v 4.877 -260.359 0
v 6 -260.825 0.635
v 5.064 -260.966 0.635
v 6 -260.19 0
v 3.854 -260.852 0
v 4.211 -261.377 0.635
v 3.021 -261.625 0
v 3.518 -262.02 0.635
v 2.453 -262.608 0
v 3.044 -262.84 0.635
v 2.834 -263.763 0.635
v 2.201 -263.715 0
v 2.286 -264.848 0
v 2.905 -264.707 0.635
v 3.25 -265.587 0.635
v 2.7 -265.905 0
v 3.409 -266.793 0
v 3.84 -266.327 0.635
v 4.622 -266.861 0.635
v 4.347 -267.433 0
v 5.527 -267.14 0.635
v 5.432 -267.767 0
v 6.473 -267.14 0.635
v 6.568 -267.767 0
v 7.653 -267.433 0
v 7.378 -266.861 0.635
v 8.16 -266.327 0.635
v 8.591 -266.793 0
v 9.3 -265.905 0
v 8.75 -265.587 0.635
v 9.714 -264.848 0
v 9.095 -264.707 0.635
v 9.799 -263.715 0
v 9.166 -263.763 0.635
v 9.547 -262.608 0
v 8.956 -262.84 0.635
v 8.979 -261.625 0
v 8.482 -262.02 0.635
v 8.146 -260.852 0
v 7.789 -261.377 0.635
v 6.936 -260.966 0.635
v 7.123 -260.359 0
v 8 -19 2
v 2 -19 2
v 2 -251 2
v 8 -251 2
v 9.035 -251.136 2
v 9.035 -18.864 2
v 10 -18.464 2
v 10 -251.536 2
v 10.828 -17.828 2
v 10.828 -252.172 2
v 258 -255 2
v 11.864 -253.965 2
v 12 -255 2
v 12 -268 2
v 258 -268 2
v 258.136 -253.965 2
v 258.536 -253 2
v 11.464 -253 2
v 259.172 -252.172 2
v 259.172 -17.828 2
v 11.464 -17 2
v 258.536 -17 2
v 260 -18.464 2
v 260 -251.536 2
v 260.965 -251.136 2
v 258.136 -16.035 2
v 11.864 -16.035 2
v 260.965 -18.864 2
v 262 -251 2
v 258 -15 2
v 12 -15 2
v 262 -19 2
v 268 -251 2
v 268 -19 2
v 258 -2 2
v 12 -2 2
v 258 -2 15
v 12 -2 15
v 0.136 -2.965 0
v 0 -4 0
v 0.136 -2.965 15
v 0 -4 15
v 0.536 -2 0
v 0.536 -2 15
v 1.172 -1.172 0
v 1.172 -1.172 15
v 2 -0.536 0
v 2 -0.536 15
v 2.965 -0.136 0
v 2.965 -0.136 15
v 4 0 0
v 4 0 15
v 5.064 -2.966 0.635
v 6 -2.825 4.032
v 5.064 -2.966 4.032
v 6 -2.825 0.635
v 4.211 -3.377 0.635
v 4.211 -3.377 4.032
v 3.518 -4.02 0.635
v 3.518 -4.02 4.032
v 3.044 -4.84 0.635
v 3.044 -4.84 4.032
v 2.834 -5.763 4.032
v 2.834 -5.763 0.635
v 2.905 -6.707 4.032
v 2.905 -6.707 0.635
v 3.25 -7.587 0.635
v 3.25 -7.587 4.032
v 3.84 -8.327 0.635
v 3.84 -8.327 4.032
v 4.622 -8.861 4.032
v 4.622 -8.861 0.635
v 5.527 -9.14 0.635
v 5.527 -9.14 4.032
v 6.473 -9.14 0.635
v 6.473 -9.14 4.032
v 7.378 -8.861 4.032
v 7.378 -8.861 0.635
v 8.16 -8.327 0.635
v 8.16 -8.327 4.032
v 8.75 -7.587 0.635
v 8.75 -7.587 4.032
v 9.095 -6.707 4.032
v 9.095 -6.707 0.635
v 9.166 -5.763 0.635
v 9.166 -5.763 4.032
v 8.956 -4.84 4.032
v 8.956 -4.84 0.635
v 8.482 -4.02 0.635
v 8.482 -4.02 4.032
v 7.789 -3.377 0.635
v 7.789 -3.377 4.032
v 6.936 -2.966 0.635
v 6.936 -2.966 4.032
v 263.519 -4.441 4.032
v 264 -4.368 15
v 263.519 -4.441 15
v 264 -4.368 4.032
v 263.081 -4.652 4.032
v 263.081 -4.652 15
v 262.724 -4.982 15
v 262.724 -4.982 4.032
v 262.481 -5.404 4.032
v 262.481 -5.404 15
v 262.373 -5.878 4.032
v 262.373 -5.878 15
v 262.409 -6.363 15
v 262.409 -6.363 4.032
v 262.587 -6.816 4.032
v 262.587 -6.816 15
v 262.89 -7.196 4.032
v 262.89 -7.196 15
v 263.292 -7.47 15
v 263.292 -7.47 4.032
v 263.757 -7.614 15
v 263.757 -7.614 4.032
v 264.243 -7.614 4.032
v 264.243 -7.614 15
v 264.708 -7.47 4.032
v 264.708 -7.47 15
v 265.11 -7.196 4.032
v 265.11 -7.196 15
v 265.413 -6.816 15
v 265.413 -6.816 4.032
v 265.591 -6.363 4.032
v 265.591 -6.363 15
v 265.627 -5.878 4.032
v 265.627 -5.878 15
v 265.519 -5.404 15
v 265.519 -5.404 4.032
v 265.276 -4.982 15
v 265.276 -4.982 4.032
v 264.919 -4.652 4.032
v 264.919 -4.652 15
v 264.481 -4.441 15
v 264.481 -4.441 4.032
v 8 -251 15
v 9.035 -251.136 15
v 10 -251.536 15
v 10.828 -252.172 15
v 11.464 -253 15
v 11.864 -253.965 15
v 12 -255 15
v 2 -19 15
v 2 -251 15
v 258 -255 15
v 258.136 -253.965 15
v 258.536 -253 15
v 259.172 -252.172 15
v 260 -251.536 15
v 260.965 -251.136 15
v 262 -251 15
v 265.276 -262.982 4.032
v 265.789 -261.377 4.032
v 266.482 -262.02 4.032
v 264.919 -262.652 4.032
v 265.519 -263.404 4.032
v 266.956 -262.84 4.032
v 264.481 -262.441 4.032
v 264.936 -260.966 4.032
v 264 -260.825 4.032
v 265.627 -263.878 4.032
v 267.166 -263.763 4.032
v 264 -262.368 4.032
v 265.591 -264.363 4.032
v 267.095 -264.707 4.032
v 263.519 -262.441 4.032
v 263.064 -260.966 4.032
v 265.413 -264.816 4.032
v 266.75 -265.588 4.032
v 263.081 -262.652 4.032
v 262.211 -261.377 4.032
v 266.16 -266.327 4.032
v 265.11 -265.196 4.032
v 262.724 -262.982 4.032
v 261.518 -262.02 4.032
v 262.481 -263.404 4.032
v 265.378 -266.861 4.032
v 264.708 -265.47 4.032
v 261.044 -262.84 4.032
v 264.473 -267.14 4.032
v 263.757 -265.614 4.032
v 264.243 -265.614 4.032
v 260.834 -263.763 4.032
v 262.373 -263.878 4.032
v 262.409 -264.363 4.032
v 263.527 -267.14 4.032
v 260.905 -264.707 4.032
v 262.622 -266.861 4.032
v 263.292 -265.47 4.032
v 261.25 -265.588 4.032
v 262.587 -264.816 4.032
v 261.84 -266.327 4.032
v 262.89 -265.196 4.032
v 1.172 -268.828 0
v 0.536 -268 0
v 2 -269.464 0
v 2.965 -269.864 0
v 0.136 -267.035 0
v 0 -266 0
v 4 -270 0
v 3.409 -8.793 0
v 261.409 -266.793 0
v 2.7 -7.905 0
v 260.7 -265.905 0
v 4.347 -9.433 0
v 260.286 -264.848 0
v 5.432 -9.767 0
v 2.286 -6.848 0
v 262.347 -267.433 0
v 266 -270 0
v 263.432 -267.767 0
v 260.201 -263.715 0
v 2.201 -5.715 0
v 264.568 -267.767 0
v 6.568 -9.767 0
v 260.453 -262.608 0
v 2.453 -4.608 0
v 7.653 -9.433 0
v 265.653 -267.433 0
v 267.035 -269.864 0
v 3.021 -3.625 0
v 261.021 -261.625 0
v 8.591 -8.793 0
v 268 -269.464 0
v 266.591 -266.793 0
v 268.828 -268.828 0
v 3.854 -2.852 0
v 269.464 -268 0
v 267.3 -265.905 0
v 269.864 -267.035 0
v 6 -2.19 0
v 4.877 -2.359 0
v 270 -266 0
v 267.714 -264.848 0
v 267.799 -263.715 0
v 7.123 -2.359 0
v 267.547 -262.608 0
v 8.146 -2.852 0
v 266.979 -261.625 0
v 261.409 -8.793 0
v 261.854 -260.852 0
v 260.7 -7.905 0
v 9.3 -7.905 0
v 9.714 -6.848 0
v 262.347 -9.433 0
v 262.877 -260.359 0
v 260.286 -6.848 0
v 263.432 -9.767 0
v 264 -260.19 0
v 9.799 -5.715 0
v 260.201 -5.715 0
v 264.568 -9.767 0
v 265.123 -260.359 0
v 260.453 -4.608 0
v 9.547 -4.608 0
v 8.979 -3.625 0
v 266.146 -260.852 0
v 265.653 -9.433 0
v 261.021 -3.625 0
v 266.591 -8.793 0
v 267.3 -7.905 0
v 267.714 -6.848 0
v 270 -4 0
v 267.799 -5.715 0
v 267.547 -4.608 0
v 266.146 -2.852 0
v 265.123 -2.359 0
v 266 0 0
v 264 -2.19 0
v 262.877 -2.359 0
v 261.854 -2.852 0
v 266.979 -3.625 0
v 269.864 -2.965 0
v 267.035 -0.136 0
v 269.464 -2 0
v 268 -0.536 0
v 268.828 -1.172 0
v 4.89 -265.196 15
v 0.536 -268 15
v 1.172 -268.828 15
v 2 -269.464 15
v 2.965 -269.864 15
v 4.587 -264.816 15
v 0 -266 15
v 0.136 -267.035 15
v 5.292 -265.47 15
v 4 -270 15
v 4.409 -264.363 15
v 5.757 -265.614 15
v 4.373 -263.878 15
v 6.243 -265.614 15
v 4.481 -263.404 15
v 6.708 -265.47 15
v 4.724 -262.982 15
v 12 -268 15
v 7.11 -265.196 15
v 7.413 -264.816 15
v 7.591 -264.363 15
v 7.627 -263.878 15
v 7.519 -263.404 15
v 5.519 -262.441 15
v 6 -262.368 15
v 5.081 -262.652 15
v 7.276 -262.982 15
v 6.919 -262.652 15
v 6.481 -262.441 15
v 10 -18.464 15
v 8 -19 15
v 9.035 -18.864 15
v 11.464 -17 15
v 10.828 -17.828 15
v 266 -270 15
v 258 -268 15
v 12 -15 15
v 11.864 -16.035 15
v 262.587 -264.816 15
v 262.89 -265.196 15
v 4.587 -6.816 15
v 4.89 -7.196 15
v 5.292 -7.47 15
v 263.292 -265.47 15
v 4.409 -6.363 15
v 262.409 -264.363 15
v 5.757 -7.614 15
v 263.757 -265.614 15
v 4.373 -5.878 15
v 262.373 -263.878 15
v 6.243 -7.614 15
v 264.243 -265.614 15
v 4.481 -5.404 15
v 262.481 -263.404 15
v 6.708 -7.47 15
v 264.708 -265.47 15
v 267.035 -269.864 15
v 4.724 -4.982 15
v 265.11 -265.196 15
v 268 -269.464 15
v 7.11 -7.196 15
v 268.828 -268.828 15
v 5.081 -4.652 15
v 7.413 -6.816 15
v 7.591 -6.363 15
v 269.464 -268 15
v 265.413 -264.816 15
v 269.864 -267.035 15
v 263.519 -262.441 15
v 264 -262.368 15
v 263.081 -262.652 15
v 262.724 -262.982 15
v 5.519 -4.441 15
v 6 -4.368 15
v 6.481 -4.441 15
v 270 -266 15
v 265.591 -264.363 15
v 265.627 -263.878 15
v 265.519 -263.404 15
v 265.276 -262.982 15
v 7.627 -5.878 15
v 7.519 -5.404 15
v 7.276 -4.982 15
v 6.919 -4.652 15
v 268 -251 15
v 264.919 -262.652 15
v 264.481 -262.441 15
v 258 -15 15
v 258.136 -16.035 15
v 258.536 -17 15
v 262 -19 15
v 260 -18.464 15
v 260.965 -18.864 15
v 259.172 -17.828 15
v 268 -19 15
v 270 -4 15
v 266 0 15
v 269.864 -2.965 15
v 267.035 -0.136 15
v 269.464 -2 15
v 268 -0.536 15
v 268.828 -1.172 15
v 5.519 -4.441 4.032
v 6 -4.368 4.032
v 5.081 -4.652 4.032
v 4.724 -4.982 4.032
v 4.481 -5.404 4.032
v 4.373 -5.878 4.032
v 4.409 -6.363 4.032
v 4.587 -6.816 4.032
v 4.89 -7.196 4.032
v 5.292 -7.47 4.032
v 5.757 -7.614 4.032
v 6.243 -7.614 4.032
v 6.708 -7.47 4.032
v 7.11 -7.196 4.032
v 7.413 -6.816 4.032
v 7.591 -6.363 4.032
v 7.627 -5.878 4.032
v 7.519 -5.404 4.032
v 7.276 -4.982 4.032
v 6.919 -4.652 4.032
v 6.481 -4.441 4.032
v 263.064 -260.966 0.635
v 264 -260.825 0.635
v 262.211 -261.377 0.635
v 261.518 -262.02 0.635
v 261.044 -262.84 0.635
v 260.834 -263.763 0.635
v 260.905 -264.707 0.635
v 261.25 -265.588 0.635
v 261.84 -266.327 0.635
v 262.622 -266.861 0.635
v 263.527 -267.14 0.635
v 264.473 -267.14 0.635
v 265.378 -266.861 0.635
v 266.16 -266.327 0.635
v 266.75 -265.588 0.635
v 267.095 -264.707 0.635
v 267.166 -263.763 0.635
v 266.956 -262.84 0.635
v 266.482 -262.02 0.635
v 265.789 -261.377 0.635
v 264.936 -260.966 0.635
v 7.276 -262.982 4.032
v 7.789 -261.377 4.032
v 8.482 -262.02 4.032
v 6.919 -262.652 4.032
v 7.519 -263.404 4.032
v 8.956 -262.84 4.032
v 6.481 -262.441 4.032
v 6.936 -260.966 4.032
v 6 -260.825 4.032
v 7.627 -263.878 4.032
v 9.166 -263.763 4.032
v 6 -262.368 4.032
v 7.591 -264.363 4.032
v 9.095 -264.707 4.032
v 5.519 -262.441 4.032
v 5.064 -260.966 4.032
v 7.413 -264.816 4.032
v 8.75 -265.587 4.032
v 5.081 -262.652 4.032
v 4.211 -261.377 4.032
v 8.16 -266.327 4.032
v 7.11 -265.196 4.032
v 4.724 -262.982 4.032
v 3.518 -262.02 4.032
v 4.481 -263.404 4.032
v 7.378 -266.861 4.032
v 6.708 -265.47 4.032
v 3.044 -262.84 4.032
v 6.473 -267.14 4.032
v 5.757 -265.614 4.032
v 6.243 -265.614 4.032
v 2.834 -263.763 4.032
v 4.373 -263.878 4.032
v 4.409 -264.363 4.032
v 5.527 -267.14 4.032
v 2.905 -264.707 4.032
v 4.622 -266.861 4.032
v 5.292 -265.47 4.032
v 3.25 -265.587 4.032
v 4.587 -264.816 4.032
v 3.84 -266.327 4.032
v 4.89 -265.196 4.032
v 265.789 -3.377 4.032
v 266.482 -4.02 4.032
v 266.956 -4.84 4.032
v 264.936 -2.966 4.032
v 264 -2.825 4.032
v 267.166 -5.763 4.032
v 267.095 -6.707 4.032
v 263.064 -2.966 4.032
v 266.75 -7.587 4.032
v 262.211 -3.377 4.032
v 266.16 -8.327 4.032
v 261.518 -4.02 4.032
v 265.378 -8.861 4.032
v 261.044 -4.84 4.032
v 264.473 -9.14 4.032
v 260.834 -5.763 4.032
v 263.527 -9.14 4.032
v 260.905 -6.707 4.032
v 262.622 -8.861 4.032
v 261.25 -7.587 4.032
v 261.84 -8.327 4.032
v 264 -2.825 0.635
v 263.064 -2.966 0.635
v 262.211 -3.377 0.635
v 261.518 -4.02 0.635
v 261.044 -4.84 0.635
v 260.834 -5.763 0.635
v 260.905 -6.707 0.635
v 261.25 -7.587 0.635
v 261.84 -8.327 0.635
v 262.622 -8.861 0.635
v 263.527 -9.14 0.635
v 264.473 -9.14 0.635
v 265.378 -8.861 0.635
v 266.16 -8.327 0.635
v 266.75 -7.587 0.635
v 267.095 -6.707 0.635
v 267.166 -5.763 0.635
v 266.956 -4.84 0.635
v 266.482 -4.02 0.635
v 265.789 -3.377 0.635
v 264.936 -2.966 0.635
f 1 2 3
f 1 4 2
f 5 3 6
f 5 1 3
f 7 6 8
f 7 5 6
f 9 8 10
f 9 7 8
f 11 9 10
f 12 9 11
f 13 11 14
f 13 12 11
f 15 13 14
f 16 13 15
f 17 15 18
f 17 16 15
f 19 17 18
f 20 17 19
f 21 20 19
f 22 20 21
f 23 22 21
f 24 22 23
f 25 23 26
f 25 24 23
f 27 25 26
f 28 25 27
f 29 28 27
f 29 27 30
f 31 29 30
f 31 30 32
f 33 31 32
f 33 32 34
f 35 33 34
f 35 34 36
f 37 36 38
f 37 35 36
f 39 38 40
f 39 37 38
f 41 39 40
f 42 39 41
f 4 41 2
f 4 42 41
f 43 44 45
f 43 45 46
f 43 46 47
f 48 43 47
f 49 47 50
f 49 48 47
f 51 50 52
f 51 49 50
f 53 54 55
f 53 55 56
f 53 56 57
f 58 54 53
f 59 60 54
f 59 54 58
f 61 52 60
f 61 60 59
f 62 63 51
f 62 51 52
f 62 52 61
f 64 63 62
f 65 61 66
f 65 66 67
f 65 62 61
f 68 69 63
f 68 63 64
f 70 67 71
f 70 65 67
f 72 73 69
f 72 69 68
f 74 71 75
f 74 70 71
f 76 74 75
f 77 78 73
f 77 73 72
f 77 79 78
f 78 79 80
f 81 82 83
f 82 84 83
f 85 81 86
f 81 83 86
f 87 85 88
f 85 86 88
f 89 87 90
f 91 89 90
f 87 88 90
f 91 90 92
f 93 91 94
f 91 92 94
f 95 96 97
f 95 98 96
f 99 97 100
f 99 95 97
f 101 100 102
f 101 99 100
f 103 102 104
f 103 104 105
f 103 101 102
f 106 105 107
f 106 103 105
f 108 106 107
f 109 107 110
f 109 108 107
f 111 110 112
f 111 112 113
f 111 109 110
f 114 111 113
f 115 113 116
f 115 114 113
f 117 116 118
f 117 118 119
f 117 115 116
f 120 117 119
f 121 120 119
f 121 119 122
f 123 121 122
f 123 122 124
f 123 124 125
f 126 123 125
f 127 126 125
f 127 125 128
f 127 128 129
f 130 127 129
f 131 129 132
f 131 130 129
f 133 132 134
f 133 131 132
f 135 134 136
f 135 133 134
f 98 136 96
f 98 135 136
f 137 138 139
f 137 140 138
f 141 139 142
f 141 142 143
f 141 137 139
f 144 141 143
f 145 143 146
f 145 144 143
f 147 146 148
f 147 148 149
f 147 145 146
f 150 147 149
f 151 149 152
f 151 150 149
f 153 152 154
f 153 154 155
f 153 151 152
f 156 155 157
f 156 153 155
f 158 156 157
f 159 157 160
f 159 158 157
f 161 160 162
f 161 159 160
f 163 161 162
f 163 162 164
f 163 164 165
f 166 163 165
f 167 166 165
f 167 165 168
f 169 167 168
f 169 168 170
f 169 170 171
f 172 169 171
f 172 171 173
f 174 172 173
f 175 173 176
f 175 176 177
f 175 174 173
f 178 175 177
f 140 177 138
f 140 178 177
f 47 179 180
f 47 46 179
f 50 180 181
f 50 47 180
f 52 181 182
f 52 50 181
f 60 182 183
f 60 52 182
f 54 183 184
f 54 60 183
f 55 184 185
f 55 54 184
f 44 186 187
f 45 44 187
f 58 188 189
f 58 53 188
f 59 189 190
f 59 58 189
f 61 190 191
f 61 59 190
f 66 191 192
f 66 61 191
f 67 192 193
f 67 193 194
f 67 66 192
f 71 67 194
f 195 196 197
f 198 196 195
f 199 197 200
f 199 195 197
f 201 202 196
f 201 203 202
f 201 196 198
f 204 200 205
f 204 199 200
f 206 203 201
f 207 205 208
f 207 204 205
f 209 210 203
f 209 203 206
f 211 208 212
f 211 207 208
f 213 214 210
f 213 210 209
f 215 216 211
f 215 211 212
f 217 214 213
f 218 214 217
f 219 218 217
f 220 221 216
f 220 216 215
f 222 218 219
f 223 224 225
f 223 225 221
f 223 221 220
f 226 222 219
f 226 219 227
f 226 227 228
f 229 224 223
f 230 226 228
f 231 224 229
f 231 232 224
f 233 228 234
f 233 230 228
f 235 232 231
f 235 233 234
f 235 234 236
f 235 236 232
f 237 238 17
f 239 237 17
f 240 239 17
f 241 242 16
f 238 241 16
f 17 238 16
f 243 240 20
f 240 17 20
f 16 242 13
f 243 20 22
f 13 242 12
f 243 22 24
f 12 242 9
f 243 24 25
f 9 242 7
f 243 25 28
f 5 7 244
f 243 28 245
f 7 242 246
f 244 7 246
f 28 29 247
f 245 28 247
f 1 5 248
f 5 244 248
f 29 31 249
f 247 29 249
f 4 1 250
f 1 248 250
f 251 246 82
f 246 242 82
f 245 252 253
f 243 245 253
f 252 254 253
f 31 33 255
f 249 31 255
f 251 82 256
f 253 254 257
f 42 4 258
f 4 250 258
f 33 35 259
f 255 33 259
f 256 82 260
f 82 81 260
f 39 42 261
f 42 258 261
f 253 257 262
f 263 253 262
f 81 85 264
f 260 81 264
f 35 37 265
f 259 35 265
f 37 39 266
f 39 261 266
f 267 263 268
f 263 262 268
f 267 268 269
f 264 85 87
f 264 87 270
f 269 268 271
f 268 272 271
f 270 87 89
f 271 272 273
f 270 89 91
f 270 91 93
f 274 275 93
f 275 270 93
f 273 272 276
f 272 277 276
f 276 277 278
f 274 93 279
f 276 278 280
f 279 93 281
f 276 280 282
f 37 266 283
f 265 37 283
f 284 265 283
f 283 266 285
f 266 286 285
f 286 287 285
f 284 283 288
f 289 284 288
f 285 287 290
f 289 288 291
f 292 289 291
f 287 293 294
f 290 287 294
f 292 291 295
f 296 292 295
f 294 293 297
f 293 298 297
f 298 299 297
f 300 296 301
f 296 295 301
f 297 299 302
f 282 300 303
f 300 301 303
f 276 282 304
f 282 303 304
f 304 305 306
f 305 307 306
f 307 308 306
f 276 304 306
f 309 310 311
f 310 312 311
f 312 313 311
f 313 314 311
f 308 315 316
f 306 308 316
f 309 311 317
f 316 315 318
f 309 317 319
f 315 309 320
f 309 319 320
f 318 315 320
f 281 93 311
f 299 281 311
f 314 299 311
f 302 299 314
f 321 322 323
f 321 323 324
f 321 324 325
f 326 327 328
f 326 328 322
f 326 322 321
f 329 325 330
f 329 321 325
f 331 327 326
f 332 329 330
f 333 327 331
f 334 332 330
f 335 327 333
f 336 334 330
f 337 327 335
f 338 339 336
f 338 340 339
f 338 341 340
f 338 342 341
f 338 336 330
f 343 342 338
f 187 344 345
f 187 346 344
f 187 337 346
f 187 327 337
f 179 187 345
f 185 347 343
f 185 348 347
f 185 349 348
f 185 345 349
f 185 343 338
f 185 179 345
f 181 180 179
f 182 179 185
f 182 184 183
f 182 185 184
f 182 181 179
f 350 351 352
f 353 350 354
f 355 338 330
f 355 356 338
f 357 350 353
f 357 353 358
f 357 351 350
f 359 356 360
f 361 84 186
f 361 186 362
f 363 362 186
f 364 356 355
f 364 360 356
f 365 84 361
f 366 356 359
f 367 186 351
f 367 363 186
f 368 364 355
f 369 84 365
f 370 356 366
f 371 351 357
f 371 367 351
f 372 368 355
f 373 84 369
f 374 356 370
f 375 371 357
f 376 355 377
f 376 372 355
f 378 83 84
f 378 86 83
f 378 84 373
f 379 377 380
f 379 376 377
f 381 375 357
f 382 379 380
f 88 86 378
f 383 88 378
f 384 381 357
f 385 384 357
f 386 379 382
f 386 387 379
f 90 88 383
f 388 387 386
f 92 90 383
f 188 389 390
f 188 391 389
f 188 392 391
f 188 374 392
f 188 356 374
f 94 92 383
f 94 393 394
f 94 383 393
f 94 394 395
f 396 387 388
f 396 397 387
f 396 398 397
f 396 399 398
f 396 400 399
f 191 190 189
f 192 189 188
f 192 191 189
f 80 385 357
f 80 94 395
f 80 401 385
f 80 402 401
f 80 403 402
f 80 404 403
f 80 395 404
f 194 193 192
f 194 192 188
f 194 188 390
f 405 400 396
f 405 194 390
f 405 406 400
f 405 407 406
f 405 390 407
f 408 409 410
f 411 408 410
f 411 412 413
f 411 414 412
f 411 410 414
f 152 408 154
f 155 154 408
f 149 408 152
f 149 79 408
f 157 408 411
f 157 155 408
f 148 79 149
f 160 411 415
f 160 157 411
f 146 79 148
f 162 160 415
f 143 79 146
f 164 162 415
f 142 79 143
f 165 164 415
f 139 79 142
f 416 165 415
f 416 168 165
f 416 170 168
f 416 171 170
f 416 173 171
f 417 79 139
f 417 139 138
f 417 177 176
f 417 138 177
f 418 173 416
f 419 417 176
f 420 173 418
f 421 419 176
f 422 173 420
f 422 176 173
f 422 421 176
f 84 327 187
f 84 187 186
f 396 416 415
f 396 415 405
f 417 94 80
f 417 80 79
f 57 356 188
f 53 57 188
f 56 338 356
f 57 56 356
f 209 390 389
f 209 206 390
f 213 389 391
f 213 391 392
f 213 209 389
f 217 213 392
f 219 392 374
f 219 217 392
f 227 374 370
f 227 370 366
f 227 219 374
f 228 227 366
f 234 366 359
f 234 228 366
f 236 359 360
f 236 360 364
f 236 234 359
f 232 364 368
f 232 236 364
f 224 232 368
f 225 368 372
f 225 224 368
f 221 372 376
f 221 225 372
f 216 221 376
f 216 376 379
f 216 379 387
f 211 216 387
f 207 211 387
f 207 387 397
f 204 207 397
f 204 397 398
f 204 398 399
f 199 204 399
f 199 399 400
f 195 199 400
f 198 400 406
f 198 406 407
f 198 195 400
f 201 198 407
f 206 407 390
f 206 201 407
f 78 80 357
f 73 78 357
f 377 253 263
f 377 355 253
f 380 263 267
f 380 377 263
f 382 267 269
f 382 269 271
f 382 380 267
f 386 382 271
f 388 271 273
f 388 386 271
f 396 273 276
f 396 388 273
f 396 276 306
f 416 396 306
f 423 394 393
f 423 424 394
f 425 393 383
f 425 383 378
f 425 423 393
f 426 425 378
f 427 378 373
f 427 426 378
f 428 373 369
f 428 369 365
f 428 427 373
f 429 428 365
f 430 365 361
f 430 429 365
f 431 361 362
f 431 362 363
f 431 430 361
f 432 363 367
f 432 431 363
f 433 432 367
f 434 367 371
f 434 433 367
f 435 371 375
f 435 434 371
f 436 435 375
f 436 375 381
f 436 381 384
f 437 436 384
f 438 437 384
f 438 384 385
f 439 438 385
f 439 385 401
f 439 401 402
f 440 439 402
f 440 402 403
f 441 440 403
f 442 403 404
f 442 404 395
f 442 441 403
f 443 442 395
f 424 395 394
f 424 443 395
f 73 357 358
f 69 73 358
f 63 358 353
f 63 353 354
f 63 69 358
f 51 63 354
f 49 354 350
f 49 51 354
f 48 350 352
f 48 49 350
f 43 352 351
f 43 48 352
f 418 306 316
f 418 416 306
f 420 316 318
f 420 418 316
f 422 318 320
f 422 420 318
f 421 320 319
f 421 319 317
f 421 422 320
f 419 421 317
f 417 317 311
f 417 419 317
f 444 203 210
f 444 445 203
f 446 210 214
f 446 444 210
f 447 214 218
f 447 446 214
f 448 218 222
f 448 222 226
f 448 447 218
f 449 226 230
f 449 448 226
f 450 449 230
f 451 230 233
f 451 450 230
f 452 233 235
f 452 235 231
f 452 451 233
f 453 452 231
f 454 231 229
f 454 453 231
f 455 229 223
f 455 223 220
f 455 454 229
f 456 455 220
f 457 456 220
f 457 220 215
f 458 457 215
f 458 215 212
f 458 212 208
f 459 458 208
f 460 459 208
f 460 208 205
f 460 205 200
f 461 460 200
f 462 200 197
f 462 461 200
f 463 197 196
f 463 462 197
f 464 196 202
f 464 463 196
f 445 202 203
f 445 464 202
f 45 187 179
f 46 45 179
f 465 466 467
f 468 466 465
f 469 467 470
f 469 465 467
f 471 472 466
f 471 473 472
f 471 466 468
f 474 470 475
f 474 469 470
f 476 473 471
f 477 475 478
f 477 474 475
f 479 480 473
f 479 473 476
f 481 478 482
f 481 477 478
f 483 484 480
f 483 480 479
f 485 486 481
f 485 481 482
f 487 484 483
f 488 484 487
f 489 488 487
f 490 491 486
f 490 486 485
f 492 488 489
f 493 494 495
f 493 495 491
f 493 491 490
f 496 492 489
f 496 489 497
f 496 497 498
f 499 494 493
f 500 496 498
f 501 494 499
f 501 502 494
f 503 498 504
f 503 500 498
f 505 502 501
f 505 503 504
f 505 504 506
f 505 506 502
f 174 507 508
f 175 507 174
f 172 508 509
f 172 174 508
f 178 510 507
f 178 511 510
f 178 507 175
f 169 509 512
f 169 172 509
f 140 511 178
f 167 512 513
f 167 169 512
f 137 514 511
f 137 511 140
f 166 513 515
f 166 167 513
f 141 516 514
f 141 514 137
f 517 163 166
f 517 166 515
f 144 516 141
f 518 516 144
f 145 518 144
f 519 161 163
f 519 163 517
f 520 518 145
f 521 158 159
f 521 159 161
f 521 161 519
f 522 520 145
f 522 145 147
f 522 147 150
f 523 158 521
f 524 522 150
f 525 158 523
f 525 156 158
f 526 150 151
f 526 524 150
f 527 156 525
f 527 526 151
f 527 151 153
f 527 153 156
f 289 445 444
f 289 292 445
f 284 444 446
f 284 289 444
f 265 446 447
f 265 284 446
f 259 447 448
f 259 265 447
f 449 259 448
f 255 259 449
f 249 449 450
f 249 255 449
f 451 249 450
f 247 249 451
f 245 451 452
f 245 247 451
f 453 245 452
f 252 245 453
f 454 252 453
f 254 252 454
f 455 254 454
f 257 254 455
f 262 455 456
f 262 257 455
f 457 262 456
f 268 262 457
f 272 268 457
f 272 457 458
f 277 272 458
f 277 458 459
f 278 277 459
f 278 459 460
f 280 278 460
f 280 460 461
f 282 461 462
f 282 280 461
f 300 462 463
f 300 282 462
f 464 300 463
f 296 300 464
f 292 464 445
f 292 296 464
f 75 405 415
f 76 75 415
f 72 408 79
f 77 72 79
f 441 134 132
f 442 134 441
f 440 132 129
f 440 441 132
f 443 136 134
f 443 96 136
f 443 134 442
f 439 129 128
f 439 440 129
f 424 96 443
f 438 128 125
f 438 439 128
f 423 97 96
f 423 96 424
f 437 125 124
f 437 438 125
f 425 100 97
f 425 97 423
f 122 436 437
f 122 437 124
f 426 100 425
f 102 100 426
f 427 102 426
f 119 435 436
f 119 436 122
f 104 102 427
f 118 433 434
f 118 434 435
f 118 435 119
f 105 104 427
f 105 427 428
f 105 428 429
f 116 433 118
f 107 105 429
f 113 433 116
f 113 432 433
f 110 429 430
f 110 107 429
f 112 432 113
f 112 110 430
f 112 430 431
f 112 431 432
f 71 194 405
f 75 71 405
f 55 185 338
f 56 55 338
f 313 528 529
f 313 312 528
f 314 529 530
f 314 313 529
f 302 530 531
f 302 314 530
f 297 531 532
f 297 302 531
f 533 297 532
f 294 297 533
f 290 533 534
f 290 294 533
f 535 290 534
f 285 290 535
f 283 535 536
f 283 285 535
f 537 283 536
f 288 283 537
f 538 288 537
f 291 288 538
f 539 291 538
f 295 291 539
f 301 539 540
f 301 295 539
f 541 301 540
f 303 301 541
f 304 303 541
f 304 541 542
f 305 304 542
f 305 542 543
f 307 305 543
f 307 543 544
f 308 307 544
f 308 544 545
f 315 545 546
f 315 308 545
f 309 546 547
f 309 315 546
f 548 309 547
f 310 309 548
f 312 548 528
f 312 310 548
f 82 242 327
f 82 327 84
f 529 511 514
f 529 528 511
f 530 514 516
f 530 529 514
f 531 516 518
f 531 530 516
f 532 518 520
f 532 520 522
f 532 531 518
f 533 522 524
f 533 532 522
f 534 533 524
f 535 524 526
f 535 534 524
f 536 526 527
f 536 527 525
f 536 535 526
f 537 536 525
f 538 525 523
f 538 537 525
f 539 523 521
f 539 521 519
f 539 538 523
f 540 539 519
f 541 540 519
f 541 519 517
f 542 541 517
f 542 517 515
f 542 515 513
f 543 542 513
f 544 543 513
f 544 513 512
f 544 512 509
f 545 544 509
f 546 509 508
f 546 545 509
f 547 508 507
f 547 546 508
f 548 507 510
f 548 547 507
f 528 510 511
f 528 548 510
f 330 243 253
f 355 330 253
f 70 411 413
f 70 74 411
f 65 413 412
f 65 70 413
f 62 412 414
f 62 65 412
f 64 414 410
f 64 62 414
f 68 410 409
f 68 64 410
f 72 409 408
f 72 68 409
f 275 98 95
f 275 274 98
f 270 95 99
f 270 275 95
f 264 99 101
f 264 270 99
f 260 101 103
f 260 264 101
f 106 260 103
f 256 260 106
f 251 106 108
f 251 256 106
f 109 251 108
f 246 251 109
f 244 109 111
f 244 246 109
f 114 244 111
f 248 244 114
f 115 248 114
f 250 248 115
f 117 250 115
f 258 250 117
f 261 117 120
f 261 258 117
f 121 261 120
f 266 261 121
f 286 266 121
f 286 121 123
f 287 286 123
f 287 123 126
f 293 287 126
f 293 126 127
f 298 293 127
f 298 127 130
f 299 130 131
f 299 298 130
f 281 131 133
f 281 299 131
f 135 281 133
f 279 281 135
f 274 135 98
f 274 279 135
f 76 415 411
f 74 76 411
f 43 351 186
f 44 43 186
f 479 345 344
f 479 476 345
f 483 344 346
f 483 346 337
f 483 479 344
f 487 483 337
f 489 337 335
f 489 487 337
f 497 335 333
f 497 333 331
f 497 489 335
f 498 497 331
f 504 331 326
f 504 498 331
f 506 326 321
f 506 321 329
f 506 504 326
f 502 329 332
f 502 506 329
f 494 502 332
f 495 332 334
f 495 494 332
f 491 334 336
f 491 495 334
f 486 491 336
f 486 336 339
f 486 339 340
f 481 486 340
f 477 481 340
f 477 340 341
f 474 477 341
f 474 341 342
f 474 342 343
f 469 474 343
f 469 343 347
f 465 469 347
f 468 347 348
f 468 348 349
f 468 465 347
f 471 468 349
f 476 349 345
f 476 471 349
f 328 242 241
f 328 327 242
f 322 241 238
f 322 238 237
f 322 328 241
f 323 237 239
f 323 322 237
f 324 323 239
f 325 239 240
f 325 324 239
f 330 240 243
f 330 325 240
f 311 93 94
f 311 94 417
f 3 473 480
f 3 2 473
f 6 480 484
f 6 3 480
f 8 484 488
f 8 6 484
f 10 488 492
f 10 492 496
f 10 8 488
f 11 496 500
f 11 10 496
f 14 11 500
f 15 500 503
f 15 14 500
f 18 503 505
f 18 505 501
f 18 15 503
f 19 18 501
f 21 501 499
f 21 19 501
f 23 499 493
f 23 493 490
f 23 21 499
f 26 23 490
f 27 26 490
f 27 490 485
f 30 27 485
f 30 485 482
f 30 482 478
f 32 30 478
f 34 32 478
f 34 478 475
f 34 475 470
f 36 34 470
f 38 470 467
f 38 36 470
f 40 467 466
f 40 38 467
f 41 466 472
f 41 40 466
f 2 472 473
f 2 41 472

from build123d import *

# Parameters (mm, degrees)
ESQUISSE1_W                                  = 270
ESQUISSE1_H                                  = 270
EXTRUSION1_DEPTH                             = 15
CONG_2_R                                     = 4
EXTRUSION2_DEPTH                             = 13
CONG_3_R                                     = 4
CHAMBRAGE_POUR_VIS_T_TE_RONDE_BOMB_E_A_COUNT = 2
CHAMBRAGE_POUR_VIS_T_TE_RONDE_BOMB_E_A_PITCH = 258
CHAMBRAGE_POUR_VIS_T_TE_RONDE_BOMB_2_COUNT   = 2
CHAMBRAGE_POUR_VIS_T_TE_RONDE_BOMB_2_PITCH   = 364.867099092
CHAMBRAGE_POUR_VIS_T_TE_RONDE_BOMB_3_COUNT   = 2
CHAMBRAGE_POUR_VIS_T_TE_RONDE_BOMB_3_PITCH   = 258


with BuildPart() as part:
    # Esquisse1 → Extrusion1 (new body)
    with BuildSketch(Plane.XY):
        with Locations((135, -135)):
            Rectangle(ESQUISSE1_W, ESQUISSE1_H)
    extrude(amount=EXTRUSION1_DEPTH)

    # Congé2
    cong_2_edges = [part.edges().sort_by_distance(p)[0] for p in [
        (0, 0, 7.5),
        (270, 0, 7.5),
        (270, -270, 7.5),
        (0, -270, 7.5),
    ]]
    fillet(cong_2_edges, radius=CONG_2_R)

    # Esquisse2 → Extrusion2 (cut)
    with BuildSketch(Plane.XY.offset(15)):
        Polygon((12, -2), (12, -19), (2, -19), (2, -251), (12, -251), (12, -268), (258, -268), (258, -251), (268, -251), (268, -19), (258, -19), (258, -2), align=None)
    extrude(amount=-EXTRUSION2_DEPTH, mode=Mode.SUBTRACT)

    # Congé3
    cong_3_edges = [part.edges().sort_by_distance(p)[0] for p in [
        (258, -19, 8.5),
        (258, -251, 8.5),
        (12, -251, 8.5),
        (12, -19, 8.5),
    ]]
    fillet(cong_3_edges, radius=CONG_3_R)

    # Esquisse6 → Chambrage pour vis à tête ronde bombée #41 (revolve, cut)
    with BuildSketch(Plane(origin=(264, -6, 0), x_dir=(0, 1, 0), z_dir=(1, 0, 0))):
        Polygon((0, 0), (0, 15), (1.63195, 15), (1.63195, 4.031996), (3.175, 4.031996), (3.175, 0.635), (3.81, 0), align=None)
    chambrage_pour_vis_t_te_ronde_bomb_e = revolve(axis=Axis((264, -6, -6.35), (0, 0, 1)), mode=Mode.SUBTRACT)

    # Chambrage pour vis à tête ronde bombée #41 a: Chambrage pour vis à tête ronde bombée #41 ×2
    with Locations(*[(-i * CHAMBRAGE_POUR_VIS_T_TE_RONDE_BOMB_E_A_PITCH, 0, 0) for i in range(1, CHAMBRAGE_POUR_VIS_T_TE_RONDE_BOMB_E_A_COUNT)]):
        add(chambrage_pour_vis_t_te_ronde_bomb_e, mode=Mode.SUBTRACT)

    # Chambrage pour vis _ t_te ronde bomb 2: Chambrage pour vis à tête ronde bombée #41 ×2
    with Locations(*[Vector(-0.707106781, -0.707106781, 0) * (i * CHAMBRAGE_POUR_VIS_T_TE_RONDE_BOMB_2_PITCH) for i in range(1, CHAMBRAGE_POUR_VIS_T_TE_RONDE_BOMB_2_COUNT)]):
        add(chambrage_pour_vis_t_te_ronde_bomb_e, mode=Mode.SUBTRACT)

    # Chambrage pour vis _ t_te ronde bomb 3: Chambrage pour vis à tête ronde bombée #41 ×2
    with Locations(*[(0, -i * CHAMBRAGE_POUR_VIS_T_TE_RONDE_BOMB_3_PITCH, 0) for i in range(1, CHAMBRAGE_POUR_VIS_T_TE_RONDE_BOMB_3_COUNT)]):
        add(chambrage_pour_vis_t_te_ronde_bomb_e, mode=Mode.SUBTRACT)


solid = part.part
